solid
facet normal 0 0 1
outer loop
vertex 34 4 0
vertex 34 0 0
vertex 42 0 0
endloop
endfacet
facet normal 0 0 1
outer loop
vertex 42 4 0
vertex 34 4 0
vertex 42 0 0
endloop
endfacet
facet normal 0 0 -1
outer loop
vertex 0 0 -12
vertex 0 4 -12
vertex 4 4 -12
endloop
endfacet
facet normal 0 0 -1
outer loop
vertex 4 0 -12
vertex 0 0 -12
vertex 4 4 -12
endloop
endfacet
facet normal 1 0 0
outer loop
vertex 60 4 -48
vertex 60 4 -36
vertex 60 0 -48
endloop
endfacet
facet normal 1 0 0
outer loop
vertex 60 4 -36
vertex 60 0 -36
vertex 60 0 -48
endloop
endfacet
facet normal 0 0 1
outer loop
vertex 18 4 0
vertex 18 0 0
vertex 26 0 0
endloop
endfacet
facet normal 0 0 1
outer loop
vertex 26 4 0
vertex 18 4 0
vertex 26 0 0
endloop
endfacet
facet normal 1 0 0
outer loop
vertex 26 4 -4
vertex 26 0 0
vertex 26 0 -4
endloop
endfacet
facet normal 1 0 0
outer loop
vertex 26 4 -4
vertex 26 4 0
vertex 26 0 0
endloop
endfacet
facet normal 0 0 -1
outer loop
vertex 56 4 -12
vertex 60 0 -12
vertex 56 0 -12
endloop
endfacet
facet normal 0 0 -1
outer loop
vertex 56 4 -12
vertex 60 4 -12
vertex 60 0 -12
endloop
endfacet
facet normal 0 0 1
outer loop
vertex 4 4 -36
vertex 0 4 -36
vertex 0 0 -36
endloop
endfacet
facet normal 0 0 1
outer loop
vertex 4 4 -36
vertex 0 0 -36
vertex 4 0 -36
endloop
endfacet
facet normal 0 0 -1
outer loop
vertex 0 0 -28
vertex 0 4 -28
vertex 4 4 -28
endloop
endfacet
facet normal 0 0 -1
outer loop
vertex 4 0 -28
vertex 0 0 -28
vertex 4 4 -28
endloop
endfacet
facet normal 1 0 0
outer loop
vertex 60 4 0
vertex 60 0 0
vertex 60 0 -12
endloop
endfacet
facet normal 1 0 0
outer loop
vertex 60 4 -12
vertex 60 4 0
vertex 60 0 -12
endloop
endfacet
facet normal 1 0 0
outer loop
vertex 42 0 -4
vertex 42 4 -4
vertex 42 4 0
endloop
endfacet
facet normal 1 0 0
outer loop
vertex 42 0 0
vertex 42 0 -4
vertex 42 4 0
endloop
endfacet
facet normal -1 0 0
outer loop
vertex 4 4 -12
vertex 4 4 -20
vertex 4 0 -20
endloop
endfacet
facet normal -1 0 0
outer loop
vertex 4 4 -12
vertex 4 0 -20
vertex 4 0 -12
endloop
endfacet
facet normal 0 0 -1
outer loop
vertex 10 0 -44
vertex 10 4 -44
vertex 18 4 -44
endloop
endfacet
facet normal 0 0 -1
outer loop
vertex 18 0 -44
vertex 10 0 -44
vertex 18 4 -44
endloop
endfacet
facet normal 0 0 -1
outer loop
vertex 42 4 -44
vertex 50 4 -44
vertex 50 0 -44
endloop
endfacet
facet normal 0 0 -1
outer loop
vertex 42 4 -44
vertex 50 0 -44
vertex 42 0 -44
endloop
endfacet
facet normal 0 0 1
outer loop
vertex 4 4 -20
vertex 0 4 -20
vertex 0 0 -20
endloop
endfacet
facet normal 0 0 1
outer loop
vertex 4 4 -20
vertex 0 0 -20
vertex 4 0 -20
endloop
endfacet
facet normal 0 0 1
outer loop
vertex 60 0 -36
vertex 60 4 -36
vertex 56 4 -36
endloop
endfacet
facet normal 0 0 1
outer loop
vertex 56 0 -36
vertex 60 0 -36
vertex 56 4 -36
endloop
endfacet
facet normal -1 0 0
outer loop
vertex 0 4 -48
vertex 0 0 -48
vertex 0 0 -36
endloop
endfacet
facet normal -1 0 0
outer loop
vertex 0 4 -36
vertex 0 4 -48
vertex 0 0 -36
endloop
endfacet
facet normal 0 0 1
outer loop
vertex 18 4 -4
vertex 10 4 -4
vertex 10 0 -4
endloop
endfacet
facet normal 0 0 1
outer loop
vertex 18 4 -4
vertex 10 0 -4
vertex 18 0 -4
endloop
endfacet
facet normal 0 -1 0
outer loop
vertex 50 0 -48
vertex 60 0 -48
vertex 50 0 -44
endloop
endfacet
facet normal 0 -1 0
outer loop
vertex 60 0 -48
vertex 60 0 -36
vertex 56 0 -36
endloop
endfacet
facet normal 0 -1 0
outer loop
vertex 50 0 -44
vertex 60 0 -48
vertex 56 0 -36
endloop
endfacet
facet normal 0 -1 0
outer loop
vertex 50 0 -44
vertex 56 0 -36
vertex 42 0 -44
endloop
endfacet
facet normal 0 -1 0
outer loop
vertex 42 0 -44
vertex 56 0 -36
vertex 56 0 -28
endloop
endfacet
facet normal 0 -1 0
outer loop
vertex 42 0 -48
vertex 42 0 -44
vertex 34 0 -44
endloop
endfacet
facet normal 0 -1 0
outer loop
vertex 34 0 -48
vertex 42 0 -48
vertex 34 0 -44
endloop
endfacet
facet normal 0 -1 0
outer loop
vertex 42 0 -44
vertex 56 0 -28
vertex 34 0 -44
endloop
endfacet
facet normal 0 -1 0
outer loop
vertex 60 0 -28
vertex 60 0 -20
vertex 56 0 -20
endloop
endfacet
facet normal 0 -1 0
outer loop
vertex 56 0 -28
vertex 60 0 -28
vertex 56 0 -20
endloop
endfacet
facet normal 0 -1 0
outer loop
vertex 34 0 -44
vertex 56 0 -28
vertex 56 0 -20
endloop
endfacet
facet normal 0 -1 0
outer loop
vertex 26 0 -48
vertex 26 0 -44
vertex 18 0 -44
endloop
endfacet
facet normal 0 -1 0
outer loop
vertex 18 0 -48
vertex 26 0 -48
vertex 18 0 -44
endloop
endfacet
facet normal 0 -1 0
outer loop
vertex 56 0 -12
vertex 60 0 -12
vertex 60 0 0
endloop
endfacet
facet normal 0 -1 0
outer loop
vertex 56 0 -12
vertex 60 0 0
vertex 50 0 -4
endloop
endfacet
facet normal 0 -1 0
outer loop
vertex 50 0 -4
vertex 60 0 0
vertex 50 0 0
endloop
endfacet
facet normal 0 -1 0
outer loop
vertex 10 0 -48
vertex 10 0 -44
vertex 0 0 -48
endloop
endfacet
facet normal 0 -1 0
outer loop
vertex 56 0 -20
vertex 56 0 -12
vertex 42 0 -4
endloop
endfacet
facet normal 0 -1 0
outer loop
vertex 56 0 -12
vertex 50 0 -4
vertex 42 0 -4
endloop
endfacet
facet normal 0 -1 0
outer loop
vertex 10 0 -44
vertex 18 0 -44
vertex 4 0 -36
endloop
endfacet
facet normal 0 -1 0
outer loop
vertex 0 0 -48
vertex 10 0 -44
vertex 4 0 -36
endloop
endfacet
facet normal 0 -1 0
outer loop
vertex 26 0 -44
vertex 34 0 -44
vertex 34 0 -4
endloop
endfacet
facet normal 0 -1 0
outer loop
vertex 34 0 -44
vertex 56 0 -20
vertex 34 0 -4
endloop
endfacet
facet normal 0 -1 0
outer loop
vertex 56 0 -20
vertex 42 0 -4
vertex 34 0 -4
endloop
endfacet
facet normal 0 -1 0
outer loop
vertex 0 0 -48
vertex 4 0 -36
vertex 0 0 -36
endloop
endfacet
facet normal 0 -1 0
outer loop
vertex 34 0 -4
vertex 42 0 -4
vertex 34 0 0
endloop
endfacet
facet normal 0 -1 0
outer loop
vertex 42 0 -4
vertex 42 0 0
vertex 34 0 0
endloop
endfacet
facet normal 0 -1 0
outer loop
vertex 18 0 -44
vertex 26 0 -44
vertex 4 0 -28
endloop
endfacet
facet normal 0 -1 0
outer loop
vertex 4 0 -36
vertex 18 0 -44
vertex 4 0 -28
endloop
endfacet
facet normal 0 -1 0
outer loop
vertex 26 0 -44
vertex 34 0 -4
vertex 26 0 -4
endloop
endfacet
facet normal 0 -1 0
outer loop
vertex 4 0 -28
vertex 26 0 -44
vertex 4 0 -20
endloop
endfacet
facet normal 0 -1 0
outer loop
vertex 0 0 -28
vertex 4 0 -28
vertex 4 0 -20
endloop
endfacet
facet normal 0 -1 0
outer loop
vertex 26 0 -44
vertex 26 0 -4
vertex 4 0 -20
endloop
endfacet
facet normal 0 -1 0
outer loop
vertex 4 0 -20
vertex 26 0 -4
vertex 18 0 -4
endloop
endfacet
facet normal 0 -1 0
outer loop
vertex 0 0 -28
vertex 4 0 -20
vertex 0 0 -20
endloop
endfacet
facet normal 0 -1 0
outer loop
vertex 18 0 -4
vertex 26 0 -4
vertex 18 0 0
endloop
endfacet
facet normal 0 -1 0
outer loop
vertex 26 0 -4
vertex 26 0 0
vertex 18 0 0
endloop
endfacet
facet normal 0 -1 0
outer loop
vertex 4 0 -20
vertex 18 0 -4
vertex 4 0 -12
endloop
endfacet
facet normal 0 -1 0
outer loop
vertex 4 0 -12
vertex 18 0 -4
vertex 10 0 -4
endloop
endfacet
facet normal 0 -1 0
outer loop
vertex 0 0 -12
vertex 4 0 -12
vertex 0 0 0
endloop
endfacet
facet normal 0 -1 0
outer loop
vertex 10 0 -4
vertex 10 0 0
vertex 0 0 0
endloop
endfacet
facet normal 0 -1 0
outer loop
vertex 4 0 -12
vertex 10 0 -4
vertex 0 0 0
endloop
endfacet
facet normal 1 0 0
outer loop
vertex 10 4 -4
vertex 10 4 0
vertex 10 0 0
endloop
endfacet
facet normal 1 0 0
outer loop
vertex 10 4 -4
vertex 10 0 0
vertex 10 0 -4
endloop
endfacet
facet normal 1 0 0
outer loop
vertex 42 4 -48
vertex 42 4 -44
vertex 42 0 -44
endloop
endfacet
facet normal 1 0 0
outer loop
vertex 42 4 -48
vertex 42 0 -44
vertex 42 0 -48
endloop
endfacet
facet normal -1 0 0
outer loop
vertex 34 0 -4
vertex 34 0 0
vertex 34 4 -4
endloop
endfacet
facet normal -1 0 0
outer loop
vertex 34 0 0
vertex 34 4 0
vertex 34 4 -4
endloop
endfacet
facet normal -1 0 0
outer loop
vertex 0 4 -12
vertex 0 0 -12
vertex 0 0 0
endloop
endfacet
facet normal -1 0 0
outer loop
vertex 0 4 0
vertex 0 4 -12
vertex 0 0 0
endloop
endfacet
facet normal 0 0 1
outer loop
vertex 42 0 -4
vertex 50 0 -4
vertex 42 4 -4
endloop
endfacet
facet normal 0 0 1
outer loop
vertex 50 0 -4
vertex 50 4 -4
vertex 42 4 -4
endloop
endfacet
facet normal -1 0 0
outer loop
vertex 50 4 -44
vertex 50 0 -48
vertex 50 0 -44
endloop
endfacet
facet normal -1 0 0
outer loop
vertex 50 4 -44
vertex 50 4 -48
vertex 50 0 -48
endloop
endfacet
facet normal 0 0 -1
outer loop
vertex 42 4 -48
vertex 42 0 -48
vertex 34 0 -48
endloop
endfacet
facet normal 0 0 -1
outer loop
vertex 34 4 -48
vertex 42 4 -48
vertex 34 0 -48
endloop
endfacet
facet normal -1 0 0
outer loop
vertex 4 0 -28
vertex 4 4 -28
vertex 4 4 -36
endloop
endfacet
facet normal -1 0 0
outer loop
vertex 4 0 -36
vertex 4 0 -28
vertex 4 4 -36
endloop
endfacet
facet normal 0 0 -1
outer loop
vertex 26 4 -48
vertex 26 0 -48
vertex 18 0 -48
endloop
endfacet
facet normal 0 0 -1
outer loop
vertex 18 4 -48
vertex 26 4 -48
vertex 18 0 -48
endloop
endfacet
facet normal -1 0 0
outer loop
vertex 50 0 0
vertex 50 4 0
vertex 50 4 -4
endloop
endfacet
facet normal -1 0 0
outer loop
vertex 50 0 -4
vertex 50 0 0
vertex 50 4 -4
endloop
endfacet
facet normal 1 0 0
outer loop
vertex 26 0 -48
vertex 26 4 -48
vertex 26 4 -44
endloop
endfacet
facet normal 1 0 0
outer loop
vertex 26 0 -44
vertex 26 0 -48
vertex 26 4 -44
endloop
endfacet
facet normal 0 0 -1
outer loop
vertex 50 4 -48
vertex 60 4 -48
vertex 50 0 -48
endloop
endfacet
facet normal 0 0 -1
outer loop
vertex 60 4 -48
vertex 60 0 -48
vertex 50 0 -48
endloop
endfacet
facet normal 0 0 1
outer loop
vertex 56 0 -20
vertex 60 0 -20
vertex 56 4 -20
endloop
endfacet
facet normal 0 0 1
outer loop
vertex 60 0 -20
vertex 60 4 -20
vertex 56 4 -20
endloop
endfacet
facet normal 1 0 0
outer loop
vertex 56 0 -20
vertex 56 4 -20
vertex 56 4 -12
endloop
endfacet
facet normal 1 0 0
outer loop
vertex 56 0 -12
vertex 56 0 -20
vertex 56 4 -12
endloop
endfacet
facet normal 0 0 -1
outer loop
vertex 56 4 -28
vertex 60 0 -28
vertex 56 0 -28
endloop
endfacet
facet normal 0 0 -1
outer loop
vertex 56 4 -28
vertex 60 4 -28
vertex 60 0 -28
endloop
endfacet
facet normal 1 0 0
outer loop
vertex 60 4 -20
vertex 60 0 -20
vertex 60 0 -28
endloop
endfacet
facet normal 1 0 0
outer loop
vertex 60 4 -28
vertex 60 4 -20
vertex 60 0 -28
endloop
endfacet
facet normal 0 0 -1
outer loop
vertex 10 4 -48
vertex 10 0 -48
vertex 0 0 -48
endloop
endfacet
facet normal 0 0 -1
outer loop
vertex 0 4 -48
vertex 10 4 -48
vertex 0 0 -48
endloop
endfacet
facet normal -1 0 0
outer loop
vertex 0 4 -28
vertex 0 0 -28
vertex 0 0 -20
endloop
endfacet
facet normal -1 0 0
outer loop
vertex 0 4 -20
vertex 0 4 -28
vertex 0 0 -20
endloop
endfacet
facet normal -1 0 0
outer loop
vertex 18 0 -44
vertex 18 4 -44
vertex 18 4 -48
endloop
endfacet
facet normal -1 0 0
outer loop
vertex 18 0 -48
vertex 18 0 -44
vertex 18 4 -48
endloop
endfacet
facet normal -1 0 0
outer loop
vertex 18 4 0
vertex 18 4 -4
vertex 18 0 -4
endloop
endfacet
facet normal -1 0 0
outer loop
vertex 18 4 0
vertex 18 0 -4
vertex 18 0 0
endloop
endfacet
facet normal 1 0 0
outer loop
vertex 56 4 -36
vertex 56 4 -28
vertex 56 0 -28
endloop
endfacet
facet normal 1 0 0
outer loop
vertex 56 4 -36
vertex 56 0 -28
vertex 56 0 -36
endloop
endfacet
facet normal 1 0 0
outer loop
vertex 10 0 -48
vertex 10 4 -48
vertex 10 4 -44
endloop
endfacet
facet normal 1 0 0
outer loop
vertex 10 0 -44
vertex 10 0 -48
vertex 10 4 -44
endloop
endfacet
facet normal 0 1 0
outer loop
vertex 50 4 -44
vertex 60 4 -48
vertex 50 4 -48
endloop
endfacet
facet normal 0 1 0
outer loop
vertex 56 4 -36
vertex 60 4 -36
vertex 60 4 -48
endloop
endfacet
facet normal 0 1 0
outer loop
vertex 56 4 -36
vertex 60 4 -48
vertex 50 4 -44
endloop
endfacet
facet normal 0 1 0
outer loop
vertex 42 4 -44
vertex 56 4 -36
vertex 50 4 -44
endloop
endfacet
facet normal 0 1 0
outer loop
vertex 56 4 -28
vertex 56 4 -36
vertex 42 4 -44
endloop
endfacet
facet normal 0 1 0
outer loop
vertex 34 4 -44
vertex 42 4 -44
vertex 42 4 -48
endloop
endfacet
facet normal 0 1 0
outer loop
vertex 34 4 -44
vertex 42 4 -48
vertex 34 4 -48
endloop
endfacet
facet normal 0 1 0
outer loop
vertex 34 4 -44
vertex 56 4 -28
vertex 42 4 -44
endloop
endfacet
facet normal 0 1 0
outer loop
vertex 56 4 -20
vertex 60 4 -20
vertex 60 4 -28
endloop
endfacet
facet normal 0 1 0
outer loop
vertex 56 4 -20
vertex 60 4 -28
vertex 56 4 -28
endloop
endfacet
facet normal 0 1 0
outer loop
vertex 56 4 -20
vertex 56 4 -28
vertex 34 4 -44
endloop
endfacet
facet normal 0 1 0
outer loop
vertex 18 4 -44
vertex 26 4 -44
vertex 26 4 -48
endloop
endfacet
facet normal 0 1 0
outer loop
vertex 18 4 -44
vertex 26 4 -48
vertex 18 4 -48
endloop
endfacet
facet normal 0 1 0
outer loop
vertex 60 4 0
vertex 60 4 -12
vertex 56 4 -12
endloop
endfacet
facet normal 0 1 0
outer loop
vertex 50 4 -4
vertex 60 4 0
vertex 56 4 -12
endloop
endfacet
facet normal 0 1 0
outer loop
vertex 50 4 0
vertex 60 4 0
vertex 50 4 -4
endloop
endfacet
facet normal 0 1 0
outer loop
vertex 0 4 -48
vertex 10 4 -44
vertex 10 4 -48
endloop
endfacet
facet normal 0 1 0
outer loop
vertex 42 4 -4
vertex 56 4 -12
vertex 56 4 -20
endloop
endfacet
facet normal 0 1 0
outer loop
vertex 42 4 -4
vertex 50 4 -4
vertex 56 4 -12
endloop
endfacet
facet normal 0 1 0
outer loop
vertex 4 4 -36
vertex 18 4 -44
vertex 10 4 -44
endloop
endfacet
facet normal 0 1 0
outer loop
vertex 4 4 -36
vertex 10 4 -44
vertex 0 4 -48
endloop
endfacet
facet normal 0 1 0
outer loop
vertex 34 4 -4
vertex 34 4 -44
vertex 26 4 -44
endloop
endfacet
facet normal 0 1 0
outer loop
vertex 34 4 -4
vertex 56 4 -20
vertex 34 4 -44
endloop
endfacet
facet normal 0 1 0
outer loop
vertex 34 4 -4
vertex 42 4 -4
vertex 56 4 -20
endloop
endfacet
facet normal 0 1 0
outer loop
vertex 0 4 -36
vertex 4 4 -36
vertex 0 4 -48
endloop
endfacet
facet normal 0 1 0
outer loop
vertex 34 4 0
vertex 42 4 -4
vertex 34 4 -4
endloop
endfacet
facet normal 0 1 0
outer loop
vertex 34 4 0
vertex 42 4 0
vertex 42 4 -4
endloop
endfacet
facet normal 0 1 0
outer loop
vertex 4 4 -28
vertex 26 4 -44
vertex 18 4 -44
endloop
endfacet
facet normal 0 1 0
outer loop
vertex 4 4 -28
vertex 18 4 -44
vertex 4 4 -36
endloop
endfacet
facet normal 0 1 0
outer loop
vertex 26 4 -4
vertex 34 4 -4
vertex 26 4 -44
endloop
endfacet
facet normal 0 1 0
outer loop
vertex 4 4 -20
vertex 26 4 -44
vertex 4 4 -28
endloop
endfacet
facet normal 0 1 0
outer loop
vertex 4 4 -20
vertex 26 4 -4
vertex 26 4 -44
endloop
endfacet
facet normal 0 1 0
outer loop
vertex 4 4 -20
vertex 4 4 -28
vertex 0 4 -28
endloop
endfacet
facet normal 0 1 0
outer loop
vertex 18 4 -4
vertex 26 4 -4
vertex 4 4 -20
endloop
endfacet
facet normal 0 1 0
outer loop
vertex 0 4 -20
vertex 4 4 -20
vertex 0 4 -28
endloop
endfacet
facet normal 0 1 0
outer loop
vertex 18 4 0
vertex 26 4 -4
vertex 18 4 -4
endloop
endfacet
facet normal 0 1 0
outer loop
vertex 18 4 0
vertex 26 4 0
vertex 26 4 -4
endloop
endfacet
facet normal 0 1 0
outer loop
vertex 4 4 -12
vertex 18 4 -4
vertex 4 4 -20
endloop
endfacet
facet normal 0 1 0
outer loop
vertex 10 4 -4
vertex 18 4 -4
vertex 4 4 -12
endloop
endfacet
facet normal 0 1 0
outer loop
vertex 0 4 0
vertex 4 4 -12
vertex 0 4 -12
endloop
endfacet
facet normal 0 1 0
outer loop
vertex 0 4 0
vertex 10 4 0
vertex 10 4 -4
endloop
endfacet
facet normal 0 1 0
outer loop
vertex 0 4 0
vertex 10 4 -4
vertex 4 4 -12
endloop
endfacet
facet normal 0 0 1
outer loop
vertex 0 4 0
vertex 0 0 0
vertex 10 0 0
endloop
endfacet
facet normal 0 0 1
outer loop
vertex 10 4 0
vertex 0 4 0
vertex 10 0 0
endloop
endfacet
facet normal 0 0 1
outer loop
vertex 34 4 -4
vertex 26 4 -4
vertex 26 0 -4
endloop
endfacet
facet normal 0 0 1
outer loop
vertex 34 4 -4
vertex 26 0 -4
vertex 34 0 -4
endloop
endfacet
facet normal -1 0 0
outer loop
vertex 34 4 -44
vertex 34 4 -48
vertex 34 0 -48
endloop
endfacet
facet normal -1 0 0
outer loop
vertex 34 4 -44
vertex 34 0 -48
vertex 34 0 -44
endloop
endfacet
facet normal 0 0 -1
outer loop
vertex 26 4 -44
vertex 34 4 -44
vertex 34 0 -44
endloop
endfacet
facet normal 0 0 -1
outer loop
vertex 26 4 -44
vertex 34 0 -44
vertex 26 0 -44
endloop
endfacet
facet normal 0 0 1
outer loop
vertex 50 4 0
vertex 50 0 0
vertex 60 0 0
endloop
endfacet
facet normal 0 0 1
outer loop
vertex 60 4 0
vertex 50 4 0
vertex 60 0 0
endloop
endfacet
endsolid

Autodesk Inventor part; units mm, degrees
ref_plane "YZ Plane" through (0, 0, 0) normal (1, 0, 0) x (0, 1, 0)
ref_plane "XZ Plane" through (0, 0, 0) normal (0, 1, 0) x (-1, 0, 0)
ref_plane "XY Plane" through (0, 0, 0) normal (0, 0, 1) x (1, 0, 0)
sketch "Sketch1" plane through (0, 0, 0) normal (0, 1, 0) x (-1, 0, 0)
  line L0 (0, 0) -> (-60, 0)
  line L1 (-60, 0) -> (-60, -48)
  line L2 (-60, -48) -> (0, -48)
  line L3 (0, -48) -> (0, 0)
  dimension "d0" = 60
  dimension "d1" = 48
extrude "Extrusion1" add sketch "Sketch1" along normal blind 4
sketch "Sketch2" plane through (0, 4, 0) normal (0, 1, 0) x (1, 0, 0)
  line L0 (0, 0) -> (60, 0) construction
  line L1 (60, 0) -> (60, 48) construction
  line L2 (60, 48) -> (0, 48) construction
  line L3 (0, 48) -> (0, 0) construction
  line L4 (4, 44) -> (56, 44) construction
  line L5 (56, 44) -> (56, 4) construction
  line L6 (56, 4) -> (4, 4) construction
  line L7 (4, 4) -> (4, 44) construction
  line L8 (60, 48) -> (0, 48) construction
  line L9 (30, 48) -> (30, 0) construction
  line L10 (0, 0) -> (60, 0) construction
  line L11 (0, 48) -> (0, 0) construction
  line L12 (0, 24) -> (60, 24) construction
  line L13 (60, 0) -> (60, 48) construction
  line L14 (0, 28) -> (4, 28)
  line L15 (0, 36) -> (4, 36)
  line L16 (10, 48) -> (10, 44)
  line L17 (10, 44) -> (18, 44)
  line L18 (18, 44) -> (18, 48)
  line L19 (18, 48) -> (10, 48)
  line L20 (26, 48) -> (26, 44)
  line L21 (26, 44) -> (30, 44)
  line L22 (26, 48) -> (30, 48)
  line L23 (0, 36) -> (0, 28)
  line L24 (4, 28) -> (4, 36)
  line L25 (60, 28) -> (56, 28)
  line L26 (60, 36) -> (56, 36)
  line L27 (50, 48) -> (50, 44)
  line L28 (50, 44) -> (42, 44)
  line L29 (42, 44) -> (42, 48)
  line L30 (42, 48) -> (50, 48)
  line L31 (34, 48) -> (34, 44)
  line L32 (34, 44) -> (30, 44)
  line L33 (34, 48) -> (30, 48)
  line L34 (60, 36) -> (60, 28)
  line L35 (56, 28) -> (56, 36)
  line L36 (60, 0) -> (0, 0) construction
  line L37 (4, 4) -> (56, 4) construction
  line L38 (60, 0) -> (0, 0) construction
  line L39 (0, 20) -> (4, 20)
  line L40 (0, 12) -> (4, 12)
  line L41 (10, 0) -> (10, 4)
  line L42 (10, 4) -> (18, 4)
  line L43 (18, 4) -> (18, 0)
  line L44 (18, 0) -> (10, 0)
  line L45 (26, 0) -> (26, 4)
  line L46 (26, 4) -> (30, 4)
  line L47 (26, 0) -> (30, 0)
  line L48 (0, 12) -> (0, 20)
  line L49 (4, 20) -> (4, 12)
  line L50 (34, 0) -> (34, 4)
  line L51 (34, 4) -> (30, 4)
  line L52 (34, 0) -> (30, 0)
  line L53 (42, 4) -> (42, 0)
  line L54 (50, 4) -> (42, 4)
  line L55 (42, 0) -> (50, 0)
  line L56 (50, 0) -> (50, 4)
  line L57 (56, 20) -> (56, 12)
  line L58 (60, 12) -> (56, 12)
  line L59 (60, 12) -> (60, 20)
  line L60 (60, 20) -> (56, 20)
  dimension "d4" = 4
  dimension "d7" = 8
  dimension "d8" = 8
  dimension "d9" = 4
  dimension "d10" = 8
  dimension "d11" = 4
extrude "Extrusion2" cut sketch "Sketch2" against normal up to surface (4 mm away)
properties part number "left" material "PBT Plastic Black"
